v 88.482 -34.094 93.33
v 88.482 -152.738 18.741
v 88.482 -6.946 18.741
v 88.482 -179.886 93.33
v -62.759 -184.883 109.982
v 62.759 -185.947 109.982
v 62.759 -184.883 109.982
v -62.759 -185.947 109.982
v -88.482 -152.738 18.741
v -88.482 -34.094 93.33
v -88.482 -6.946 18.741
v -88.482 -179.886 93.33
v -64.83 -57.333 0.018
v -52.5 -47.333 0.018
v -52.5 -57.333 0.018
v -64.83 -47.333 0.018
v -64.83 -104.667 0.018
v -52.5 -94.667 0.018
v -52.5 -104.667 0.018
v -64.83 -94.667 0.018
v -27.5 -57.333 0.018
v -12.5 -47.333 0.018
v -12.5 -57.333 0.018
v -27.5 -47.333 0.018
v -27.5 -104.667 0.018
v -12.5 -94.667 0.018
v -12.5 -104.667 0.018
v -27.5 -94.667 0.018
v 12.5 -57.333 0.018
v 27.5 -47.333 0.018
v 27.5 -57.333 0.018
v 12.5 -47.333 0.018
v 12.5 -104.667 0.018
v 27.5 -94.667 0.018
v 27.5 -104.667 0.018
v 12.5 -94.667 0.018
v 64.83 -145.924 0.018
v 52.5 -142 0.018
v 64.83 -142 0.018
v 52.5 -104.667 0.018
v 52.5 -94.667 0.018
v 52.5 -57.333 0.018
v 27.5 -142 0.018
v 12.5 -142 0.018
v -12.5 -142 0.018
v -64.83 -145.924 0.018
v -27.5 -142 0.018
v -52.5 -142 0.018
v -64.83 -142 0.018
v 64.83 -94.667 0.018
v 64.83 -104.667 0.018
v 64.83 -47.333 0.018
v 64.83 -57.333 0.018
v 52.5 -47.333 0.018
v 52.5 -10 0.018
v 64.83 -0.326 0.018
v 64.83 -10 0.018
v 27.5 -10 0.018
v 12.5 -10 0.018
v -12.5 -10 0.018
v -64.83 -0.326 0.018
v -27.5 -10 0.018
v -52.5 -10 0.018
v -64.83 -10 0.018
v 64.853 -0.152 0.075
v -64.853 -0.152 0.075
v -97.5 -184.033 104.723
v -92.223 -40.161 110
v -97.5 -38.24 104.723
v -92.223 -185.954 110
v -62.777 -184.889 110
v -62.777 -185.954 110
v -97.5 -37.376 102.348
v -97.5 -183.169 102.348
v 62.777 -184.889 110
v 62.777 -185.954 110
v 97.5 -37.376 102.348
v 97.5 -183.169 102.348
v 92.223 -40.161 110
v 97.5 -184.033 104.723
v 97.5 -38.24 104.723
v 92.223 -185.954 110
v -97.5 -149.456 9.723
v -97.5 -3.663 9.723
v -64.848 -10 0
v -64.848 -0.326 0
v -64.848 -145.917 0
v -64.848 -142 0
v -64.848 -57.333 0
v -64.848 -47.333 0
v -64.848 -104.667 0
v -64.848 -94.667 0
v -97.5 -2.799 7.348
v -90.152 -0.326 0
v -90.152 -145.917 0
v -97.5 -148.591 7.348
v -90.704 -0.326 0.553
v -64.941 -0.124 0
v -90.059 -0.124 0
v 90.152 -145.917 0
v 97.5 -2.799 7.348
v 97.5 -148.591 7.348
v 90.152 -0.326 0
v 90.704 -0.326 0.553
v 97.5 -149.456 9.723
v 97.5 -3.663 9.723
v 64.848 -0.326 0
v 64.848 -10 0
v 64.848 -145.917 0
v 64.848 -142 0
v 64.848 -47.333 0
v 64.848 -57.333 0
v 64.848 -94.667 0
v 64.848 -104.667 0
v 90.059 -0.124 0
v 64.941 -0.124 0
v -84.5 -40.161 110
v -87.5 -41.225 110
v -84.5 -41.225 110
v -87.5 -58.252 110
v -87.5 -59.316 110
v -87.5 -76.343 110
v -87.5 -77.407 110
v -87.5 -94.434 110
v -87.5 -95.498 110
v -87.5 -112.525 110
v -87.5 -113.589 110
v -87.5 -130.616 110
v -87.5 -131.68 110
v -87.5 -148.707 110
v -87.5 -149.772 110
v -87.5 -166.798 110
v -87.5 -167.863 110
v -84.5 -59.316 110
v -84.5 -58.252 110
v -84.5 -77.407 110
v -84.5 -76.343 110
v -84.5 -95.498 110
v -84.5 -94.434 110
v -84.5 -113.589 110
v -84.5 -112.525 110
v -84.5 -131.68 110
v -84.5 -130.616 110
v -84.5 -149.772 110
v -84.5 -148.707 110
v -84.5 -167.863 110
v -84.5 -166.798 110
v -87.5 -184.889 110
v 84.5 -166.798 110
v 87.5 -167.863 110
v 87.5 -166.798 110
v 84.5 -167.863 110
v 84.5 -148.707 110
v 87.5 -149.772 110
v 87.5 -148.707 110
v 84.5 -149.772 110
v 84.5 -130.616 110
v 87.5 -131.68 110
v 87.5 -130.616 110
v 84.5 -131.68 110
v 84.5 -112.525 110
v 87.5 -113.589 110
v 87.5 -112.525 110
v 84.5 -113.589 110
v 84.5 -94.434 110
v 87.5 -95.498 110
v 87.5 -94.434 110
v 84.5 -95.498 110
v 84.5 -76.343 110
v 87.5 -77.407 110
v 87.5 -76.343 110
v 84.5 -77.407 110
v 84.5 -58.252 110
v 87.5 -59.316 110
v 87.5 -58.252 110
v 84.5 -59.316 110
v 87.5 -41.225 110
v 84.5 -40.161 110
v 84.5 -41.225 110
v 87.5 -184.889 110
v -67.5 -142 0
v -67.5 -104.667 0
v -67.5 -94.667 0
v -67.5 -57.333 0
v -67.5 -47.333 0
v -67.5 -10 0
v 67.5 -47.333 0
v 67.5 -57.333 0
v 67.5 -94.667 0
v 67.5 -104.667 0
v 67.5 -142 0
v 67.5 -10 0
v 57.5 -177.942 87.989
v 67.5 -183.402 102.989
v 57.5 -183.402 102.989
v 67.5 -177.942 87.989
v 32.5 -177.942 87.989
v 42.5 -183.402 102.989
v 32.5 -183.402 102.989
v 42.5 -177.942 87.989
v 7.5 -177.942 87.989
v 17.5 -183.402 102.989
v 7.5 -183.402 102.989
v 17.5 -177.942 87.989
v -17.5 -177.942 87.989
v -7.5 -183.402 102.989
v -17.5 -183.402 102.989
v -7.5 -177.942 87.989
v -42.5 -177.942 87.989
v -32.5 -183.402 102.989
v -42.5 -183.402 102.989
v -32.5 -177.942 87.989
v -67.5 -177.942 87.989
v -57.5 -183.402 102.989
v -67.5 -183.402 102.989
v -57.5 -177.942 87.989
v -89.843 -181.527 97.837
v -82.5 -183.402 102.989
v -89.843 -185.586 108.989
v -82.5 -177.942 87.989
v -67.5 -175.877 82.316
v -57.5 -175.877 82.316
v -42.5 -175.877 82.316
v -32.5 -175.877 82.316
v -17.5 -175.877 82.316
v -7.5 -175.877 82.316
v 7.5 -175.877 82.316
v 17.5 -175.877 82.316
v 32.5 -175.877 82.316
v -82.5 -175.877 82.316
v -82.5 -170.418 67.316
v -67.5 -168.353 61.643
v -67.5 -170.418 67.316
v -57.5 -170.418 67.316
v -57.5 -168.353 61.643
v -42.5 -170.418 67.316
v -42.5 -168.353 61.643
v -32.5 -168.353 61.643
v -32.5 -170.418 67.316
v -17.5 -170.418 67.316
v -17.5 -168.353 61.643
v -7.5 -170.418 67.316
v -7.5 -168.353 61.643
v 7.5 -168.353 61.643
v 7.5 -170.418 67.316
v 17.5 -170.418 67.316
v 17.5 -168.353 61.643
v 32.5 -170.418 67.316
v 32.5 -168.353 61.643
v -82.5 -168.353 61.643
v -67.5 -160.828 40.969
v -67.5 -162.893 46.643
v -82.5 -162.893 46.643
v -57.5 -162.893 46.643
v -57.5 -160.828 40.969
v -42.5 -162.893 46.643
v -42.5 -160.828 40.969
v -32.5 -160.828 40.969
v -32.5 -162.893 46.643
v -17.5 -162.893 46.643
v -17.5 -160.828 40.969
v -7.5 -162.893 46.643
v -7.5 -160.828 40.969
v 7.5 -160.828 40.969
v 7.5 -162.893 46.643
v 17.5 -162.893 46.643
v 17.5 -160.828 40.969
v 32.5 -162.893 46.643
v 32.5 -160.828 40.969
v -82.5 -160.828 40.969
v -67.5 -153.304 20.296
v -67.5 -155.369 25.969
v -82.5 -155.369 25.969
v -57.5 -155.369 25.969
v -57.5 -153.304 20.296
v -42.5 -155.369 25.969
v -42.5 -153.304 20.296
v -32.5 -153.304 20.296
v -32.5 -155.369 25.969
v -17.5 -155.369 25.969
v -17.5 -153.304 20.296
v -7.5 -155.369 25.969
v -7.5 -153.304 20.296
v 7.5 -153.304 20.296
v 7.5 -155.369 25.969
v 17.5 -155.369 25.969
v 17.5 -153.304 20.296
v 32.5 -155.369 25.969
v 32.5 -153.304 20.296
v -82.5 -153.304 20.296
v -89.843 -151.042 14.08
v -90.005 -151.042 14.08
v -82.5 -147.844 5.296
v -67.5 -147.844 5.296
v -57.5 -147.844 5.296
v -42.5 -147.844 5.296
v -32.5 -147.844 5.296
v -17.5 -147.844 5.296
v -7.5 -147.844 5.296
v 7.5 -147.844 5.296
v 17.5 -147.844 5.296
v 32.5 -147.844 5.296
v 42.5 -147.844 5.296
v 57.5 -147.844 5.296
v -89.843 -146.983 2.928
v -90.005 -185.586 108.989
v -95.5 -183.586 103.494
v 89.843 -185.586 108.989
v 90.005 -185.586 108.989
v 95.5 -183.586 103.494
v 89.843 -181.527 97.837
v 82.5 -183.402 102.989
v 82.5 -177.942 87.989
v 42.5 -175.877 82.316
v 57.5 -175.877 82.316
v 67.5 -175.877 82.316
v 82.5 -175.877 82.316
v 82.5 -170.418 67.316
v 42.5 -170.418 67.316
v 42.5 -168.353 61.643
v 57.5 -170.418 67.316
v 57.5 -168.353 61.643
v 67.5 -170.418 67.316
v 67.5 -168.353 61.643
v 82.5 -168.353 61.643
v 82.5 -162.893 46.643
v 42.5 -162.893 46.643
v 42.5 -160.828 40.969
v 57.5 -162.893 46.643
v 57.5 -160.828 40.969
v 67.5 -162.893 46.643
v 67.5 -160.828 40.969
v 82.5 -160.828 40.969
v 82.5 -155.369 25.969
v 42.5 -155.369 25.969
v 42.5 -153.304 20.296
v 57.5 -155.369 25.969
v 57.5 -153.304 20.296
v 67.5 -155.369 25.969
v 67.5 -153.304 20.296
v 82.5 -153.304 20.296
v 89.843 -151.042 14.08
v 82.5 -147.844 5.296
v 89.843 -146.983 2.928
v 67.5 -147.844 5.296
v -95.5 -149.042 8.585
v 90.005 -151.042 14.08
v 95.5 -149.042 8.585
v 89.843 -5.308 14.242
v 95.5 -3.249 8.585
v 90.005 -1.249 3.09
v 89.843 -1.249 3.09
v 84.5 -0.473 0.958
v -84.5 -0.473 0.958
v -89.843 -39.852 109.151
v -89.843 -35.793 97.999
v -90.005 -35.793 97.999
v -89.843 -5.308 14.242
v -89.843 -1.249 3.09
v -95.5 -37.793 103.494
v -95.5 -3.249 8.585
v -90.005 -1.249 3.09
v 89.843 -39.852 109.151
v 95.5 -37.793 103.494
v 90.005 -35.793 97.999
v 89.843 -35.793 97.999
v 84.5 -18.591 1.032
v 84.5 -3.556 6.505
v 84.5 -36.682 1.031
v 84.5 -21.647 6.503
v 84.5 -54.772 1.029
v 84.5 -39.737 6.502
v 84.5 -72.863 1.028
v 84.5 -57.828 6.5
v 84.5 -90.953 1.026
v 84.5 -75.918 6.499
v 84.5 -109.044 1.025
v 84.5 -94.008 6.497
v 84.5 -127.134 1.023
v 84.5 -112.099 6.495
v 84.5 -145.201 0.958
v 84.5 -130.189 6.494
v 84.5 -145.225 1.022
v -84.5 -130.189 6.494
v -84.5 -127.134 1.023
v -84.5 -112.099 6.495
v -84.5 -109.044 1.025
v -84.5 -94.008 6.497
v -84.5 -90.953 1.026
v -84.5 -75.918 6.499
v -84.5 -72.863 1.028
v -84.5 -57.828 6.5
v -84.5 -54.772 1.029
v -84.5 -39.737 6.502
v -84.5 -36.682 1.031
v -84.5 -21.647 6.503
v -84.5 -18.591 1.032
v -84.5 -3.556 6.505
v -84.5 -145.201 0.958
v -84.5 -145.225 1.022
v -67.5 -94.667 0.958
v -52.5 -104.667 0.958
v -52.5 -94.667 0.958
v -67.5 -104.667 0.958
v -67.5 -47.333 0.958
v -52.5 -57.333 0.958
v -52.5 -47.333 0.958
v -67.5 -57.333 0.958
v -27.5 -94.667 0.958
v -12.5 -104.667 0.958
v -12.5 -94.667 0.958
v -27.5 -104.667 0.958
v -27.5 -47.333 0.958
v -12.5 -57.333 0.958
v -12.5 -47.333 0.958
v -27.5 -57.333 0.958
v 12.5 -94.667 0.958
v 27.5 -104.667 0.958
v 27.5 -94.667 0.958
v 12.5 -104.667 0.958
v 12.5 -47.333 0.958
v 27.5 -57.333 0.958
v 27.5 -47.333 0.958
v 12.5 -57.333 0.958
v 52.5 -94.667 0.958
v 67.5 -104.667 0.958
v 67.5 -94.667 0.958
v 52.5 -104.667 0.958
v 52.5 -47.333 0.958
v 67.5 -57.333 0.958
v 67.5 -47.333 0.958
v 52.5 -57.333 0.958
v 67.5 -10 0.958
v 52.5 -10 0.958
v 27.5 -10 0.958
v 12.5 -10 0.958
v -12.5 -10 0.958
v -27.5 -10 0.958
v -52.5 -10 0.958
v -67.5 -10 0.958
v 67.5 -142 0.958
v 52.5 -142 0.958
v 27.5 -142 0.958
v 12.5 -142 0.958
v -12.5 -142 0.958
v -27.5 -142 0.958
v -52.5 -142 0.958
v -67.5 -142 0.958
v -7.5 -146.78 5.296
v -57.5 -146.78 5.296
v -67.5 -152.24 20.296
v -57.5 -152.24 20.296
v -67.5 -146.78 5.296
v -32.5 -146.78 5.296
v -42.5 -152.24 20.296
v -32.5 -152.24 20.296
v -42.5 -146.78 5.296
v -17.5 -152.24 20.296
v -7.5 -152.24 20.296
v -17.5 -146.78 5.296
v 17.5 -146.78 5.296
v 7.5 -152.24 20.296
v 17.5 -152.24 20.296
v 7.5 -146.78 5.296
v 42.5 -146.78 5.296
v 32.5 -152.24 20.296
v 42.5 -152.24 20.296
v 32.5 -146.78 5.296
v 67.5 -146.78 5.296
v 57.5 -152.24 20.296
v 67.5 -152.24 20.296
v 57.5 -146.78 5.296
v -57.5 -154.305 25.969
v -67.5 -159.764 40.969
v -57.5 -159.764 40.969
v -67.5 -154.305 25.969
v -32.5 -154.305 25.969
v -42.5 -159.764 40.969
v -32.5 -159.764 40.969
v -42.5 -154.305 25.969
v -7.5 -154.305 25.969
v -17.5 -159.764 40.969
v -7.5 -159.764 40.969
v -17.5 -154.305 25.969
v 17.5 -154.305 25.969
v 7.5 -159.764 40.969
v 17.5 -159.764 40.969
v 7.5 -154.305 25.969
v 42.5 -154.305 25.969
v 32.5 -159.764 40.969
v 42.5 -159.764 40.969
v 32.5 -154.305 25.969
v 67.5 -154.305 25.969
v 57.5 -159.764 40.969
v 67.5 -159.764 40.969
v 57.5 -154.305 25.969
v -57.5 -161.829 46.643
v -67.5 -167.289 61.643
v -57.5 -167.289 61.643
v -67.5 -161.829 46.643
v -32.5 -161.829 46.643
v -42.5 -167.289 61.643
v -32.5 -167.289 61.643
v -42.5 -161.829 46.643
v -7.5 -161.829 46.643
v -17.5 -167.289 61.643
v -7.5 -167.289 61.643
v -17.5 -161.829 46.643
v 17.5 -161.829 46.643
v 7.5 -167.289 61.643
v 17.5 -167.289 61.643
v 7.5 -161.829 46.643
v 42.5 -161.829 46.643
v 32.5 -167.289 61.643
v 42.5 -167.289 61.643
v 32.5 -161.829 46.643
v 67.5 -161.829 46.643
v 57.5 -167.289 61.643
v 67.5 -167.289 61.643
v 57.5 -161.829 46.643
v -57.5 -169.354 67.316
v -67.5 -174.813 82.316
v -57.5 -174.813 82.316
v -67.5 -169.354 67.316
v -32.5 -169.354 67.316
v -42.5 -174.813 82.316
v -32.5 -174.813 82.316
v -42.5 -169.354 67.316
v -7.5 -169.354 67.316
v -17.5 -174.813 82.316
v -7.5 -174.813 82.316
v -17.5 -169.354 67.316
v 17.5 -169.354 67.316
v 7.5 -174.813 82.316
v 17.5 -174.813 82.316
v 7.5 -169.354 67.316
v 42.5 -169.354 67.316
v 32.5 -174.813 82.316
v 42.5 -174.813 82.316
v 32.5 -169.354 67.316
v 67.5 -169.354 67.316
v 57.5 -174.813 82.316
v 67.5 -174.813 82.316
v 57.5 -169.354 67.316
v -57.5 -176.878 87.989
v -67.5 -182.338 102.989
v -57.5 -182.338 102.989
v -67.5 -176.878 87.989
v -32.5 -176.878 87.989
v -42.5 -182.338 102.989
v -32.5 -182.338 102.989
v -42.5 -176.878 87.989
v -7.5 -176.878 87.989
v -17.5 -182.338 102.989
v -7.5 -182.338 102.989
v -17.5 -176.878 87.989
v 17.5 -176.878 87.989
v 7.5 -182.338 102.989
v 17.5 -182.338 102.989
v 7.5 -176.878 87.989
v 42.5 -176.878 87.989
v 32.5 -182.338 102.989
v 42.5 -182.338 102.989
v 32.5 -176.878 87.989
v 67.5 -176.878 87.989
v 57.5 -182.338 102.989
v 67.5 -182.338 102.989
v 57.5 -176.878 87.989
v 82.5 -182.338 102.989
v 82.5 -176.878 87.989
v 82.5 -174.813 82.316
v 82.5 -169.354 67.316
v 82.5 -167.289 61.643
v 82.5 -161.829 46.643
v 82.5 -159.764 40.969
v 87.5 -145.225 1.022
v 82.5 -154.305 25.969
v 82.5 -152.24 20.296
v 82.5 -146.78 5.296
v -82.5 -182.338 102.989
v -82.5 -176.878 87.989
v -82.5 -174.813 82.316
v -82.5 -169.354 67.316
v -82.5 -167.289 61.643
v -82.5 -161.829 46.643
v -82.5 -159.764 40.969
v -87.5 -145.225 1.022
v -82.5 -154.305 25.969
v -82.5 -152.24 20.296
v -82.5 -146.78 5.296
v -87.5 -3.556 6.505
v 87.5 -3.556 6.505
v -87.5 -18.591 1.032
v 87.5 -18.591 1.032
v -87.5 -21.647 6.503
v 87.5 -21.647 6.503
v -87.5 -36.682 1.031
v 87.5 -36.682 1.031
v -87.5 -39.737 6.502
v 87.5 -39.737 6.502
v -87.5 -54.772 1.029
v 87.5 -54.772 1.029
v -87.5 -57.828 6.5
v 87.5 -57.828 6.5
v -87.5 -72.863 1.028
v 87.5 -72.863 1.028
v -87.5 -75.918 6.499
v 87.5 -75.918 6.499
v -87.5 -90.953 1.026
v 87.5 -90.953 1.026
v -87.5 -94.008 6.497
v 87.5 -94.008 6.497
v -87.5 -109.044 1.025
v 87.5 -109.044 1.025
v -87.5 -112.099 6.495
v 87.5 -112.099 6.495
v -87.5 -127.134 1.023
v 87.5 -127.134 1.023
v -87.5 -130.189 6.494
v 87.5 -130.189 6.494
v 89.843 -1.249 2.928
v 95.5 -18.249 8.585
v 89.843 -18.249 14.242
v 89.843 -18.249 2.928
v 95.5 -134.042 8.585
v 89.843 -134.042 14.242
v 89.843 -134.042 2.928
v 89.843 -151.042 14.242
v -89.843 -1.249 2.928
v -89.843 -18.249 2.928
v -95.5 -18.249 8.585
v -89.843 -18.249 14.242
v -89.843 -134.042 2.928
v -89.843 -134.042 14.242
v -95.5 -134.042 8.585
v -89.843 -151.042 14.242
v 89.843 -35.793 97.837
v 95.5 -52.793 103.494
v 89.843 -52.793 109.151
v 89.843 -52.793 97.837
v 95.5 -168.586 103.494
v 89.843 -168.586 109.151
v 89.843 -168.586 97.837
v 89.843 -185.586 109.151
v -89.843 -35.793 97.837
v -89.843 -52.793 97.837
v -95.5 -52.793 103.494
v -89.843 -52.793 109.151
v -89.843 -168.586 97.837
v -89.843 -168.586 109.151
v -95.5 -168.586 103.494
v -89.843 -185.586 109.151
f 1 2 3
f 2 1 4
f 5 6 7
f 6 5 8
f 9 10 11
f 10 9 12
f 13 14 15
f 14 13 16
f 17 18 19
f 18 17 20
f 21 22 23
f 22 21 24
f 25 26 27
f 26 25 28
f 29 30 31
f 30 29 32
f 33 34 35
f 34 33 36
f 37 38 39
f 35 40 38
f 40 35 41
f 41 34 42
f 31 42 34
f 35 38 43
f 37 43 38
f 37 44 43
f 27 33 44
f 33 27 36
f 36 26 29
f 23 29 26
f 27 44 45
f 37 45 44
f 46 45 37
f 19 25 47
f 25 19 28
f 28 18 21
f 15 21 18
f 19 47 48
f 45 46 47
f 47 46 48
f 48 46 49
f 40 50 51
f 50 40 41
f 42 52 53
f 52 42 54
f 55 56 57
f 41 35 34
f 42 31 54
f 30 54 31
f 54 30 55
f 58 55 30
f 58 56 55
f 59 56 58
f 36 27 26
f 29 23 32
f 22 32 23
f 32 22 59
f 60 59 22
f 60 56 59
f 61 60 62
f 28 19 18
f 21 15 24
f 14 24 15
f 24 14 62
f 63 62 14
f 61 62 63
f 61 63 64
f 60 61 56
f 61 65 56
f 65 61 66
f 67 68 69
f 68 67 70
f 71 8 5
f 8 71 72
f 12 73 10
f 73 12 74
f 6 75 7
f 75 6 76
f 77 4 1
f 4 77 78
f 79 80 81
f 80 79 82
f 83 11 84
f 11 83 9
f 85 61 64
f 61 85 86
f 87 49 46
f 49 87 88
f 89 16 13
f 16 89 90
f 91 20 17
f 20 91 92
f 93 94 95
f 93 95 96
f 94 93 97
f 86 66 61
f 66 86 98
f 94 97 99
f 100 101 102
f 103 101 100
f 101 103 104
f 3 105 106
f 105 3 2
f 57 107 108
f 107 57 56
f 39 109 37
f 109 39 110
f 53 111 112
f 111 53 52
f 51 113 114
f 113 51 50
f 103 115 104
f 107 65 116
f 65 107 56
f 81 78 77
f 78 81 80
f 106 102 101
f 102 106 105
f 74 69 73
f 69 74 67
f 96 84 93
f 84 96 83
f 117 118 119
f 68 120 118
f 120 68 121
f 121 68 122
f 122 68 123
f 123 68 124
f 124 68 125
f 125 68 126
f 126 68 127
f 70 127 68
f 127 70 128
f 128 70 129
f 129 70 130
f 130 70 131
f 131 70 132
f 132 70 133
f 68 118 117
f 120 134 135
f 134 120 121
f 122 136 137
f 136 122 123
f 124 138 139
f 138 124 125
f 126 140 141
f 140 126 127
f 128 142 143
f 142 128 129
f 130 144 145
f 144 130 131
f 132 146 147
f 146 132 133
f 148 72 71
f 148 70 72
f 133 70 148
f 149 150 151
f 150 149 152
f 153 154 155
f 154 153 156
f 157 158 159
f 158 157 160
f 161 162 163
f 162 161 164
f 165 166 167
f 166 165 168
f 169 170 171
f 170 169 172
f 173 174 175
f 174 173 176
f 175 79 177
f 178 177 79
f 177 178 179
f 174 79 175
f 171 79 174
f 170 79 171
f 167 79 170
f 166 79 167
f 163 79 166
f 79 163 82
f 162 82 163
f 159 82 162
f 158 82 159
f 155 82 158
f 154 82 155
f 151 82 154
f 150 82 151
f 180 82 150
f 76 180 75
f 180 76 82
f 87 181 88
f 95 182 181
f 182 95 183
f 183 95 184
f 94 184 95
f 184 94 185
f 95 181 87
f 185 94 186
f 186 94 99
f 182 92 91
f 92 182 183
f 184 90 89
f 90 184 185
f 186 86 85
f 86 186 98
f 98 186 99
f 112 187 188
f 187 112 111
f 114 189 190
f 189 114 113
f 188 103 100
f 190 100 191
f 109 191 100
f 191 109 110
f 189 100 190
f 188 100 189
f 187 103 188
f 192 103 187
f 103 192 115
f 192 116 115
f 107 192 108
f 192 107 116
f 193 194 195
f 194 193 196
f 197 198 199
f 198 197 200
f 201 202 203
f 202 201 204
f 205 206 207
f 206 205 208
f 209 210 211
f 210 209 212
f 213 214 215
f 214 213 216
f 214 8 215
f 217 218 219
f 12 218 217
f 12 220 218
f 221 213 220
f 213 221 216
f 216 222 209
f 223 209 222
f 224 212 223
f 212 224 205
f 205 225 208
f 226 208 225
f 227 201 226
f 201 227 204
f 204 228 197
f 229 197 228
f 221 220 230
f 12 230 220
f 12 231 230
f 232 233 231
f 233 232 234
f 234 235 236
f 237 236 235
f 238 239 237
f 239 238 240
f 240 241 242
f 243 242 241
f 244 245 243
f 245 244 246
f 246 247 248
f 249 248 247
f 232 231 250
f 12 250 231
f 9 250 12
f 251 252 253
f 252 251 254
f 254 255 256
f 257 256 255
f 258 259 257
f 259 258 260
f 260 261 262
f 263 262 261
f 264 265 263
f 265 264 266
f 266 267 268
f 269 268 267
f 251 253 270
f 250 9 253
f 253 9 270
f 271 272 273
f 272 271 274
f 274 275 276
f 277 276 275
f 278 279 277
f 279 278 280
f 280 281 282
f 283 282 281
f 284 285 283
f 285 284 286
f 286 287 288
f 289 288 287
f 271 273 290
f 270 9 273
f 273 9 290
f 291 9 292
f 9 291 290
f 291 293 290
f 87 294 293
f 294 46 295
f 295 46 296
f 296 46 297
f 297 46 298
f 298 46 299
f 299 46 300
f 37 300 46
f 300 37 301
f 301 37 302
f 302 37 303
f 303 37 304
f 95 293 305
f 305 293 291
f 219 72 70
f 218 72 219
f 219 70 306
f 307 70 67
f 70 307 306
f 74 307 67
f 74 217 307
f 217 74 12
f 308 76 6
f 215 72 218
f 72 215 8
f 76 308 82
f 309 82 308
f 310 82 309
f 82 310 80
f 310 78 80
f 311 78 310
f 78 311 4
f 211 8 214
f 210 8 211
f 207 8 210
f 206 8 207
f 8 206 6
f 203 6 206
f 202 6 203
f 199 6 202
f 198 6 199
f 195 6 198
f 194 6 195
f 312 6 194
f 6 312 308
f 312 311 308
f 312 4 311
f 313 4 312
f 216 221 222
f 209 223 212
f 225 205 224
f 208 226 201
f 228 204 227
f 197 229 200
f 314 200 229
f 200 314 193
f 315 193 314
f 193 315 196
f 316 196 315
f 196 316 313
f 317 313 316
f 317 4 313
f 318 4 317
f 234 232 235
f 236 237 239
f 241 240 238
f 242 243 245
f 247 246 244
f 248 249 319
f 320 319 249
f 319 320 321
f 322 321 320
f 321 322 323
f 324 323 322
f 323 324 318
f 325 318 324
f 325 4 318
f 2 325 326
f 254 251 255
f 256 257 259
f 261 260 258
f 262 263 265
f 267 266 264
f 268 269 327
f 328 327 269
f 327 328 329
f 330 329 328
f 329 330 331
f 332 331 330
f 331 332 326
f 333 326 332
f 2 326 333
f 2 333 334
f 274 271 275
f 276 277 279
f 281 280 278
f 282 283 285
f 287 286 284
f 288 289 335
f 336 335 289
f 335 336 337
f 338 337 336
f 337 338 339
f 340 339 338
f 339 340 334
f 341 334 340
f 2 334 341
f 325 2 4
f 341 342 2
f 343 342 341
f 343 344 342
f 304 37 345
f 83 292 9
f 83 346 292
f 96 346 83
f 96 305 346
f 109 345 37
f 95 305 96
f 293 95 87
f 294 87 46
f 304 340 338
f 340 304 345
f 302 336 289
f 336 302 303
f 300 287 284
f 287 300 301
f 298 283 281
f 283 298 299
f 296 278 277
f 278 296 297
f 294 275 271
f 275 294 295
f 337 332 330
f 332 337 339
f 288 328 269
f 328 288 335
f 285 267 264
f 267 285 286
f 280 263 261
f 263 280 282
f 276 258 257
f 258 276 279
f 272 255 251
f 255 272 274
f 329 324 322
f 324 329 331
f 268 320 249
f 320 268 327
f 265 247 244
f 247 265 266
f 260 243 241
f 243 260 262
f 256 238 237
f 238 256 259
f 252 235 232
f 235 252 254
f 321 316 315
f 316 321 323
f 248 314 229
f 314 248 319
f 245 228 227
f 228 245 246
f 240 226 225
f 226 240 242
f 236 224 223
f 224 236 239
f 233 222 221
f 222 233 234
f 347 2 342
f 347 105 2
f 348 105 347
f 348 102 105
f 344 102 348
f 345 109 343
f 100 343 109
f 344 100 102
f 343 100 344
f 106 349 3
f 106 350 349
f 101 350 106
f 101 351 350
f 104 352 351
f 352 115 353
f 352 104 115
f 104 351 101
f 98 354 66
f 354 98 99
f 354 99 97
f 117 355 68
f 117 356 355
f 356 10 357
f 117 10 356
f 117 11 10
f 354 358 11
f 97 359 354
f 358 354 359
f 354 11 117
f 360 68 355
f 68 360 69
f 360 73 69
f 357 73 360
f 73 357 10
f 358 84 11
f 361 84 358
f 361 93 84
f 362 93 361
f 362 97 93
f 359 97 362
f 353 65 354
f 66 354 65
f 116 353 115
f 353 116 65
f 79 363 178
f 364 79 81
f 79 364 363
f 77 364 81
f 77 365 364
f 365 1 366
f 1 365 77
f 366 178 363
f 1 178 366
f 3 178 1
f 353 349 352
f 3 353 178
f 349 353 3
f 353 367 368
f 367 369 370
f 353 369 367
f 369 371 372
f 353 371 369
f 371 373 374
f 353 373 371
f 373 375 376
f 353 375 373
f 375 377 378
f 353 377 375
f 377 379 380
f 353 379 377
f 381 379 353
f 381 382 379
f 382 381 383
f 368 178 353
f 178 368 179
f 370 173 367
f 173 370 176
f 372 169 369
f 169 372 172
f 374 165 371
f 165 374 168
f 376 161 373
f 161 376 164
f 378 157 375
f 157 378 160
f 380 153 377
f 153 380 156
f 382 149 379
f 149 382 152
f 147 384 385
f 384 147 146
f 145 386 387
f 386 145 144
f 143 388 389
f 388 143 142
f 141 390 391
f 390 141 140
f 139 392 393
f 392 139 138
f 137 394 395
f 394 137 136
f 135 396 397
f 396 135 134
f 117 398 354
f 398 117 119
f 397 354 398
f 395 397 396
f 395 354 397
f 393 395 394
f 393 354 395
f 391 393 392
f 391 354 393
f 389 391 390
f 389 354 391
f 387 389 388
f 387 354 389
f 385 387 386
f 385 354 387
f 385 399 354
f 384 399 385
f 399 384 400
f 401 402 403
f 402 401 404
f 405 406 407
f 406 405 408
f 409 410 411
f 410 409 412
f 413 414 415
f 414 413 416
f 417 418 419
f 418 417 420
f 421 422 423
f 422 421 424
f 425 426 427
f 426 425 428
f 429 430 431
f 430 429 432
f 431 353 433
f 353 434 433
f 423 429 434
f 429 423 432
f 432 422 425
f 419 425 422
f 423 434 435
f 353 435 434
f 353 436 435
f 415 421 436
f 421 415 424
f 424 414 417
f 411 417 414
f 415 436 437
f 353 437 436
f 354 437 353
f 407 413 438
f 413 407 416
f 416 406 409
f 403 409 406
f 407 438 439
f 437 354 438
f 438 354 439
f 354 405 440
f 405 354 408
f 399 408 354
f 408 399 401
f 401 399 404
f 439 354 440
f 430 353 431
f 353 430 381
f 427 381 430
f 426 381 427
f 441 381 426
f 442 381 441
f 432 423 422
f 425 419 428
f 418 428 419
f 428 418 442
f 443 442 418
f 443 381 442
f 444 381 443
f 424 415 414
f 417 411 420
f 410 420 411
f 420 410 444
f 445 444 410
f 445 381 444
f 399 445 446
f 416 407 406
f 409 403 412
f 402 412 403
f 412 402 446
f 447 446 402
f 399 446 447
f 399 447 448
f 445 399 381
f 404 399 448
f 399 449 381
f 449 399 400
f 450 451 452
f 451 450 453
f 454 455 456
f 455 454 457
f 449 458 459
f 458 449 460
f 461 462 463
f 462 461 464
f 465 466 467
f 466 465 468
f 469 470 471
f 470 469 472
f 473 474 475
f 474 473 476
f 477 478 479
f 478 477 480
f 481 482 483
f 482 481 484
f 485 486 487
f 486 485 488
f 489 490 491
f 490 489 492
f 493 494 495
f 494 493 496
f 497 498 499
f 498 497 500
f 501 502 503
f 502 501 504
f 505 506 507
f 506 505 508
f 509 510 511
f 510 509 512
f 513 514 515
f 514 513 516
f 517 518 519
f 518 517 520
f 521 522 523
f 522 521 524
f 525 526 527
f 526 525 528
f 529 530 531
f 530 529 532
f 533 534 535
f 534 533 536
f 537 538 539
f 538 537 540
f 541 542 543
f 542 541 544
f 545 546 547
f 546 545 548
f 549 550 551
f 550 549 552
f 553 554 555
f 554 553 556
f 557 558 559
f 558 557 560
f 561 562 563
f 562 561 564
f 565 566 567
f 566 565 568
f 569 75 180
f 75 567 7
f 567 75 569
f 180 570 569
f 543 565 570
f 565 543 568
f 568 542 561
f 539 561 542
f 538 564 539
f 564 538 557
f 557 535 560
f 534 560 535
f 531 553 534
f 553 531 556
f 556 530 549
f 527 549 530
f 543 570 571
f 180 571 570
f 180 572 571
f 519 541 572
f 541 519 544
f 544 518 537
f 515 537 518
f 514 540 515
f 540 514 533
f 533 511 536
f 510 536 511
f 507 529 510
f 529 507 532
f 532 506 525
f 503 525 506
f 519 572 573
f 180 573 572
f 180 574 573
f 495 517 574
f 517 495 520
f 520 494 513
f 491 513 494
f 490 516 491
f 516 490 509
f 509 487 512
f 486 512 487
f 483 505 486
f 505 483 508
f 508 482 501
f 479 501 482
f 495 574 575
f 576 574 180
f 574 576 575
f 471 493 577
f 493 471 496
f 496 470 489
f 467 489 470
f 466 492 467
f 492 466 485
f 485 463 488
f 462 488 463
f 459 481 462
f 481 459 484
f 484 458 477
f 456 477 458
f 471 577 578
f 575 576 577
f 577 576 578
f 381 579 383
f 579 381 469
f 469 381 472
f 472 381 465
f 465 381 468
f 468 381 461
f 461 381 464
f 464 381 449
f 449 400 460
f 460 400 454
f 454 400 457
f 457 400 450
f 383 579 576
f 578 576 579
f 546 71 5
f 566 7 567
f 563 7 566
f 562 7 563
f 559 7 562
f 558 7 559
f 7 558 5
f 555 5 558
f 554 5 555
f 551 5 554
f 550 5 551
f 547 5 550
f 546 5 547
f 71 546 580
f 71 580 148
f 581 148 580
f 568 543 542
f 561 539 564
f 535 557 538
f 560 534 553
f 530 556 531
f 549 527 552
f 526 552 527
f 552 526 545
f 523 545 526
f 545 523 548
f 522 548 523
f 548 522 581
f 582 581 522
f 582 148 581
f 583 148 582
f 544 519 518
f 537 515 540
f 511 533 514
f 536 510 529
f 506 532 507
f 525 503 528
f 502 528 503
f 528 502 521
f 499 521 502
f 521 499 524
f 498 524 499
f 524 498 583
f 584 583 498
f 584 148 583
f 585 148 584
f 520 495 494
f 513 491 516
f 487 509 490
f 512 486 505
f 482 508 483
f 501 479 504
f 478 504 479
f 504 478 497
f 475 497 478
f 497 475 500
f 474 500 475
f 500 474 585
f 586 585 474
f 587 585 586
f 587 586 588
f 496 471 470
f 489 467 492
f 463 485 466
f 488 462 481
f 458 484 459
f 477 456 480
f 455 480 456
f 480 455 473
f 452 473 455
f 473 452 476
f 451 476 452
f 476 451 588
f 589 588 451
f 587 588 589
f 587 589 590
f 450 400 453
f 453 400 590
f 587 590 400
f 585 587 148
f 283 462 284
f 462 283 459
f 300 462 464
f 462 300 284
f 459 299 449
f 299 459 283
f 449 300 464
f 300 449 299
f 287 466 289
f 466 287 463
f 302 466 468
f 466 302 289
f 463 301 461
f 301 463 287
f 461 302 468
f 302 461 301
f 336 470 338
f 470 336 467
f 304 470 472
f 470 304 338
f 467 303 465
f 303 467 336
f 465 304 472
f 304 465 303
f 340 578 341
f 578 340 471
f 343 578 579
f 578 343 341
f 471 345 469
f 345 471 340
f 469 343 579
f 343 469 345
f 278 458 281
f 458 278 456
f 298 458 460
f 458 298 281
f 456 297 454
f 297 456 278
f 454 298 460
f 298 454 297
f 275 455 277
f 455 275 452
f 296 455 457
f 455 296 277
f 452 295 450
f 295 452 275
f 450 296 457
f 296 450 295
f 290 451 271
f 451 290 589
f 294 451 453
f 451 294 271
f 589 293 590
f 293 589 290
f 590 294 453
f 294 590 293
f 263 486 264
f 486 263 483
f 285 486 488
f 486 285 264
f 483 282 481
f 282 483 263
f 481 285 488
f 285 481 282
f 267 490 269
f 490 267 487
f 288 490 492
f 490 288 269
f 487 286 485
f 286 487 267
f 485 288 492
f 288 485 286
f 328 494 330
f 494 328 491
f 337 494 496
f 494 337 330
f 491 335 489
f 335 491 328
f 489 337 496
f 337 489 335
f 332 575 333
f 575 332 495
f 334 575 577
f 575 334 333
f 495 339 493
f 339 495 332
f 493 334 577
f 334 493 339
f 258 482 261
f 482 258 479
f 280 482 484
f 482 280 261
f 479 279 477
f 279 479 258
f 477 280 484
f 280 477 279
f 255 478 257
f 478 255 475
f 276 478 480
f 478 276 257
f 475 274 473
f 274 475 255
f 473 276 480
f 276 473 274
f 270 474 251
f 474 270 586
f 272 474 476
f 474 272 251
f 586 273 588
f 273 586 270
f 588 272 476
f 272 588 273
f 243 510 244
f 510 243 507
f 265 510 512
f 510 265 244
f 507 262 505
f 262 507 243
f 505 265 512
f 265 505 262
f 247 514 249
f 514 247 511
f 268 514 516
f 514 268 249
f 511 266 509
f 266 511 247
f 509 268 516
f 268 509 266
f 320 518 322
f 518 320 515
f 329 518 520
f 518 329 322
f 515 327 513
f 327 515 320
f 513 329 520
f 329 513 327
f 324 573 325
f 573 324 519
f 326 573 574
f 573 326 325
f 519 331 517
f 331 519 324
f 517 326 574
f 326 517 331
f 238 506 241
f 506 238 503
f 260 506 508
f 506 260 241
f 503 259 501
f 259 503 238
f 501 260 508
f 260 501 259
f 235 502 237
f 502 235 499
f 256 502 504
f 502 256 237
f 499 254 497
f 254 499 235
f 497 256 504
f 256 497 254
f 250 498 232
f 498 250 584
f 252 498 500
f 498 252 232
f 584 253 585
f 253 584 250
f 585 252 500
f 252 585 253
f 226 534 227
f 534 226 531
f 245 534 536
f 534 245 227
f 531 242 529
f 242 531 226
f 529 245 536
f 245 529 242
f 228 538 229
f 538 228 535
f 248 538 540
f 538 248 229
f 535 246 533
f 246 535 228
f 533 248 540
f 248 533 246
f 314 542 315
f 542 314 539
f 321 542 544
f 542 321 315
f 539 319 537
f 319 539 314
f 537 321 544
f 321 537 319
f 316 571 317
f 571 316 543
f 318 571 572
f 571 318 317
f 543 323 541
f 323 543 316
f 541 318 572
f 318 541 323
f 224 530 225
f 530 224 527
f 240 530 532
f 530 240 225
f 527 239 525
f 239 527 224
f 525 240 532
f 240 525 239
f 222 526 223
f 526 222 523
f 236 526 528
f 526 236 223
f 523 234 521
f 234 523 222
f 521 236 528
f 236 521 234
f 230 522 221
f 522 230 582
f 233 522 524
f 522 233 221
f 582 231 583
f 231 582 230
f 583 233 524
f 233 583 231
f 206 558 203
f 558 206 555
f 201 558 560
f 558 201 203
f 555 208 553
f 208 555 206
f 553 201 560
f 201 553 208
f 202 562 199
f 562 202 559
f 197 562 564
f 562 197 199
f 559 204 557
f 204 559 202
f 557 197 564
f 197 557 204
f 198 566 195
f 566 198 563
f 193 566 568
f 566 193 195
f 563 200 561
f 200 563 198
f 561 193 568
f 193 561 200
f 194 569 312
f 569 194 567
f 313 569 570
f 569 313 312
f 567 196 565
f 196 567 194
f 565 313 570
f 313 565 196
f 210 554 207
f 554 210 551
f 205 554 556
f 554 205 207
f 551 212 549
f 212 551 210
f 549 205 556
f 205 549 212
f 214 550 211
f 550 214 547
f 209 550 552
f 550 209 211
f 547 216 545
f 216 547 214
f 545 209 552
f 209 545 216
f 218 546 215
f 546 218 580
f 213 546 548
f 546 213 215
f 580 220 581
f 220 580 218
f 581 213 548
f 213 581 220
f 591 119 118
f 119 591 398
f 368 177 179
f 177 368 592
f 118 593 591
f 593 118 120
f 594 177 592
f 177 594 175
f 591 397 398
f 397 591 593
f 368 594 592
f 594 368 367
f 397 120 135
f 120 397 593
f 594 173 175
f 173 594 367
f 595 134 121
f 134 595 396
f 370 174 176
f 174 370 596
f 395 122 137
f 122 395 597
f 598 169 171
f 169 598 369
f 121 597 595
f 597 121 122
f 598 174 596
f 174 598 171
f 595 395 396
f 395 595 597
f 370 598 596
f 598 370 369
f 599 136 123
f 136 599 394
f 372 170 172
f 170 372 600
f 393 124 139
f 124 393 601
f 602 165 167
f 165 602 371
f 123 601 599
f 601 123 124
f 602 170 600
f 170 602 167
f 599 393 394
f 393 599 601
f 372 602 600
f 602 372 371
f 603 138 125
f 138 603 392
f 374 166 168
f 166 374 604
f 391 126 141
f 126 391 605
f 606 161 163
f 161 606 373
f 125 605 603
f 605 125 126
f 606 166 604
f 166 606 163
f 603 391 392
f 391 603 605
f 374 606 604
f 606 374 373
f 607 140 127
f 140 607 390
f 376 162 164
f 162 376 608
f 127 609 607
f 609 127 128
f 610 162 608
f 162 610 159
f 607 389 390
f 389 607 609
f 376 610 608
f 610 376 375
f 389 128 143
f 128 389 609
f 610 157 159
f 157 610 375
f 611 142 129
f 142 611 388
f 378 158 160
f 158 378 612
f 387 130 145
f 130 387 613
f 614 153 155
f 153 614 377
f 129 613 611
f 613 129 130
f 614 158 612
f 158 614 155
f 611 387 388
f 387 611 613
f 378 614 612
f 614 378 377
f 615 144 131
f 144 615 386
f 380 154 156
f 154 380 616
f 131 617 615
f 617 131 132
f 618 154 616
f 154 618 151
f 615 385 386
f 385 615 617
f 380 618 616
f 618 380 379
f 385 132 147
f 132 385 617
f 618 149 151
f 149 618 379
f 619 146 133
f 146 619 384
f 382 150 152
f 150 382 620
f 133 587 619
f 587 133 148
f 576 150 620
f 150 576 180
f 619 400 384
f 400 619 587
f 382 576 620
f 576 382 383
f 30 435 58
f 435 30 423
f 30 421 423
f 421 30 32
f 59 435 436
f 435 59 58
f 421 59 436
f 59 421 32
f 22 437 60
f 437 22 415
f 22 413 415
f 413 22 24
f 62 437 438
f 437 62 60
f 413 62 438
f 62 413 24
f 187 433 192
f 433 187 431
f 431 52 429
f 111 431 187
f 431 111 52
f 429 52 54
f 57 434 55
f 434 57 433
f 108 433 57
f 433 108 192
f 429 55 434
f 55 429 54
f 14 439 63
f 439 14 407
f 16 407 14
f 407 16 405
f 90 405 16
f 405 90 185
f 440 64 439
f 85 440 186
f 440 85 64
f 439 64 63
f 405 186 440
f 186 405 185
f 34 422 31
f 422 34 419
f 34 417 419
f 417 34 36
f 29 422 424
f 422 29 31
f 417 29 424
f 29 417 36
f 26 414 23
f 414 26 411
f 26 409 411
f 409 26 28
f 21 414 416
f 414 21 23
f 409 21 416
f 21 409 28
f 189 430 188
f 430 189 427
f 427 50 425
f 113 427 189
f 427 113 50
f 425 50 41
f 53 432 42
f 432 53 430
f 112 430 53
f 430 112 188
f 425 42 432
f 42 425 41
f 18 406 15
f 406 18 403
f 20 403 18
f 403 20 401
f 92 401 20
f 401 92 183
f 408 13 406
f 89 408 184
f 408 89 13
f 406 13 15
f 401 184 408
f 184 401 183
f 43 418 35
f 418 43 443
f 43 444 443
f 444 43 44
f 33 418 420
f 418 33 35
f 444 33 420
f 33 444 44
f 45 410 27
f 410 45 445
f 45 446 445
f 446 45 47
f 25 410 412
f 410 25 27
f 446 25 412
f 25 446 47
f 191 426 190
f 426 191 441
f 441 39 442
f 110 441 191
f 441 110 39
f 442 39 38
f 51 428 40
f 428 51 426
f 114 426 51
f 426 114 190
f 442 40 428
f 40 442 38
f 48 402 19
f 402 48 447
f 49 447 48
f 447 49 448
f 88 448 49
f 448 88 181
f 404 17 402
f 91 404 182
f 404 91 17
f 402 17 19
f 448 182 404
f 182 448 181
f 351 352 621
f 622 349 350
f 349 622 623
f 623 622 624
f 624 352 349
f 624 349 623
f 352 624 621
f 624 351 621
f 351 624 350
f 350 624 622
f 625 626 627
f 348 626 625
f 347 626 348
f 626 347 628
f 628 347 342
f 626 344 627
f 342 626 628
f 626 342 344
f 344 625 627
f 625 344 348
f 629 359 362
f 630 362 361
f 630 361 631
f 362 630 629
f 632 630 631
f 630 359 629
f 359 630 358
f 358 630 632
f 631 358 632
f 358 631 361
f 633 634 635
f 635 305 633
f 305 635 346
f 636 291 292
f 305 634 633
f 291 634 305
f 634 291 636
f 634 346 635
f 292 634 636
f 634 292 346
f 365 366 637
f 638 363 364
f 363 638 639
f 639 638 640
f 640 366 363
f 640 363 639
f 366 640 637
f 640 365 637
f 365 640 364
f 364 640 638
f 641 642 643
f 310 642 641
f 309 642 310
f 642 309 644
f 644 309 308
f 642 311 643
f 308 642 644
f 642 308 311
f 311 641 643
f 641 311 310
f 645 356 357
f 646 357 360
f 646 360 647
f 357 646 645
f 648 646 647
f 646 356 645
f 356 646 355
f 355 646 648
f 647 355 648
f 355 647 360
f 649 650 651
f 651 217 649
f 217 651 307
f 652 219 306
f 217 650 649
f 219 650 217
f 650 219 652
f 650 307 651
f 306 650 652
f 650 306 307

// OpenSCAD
module rounded_cube(x,y,z,corner) {

    module rcube(x,y,z,corner) {
        translate([corner/2,corner/2,corner/2]) hull() {
            sphere(d=corner);
            if (x>corner) translate([x-corner,0,0]) sphere(d=corner);
            if (x>corner && y>corner) translate([x-corner,y-corner,0]) sphere(d=corner);
            if (y>corner) translate([0,y-corner,0]) sphere(d=corner);
            if (z>corner) translate([0,0,z-corner]) sphere(d=corner);
            if (z>corner && x>corner) translate([x-corner,0,z-corner]) sphere(d=corner);
            if (z>corner && x>corner && y>corner) translate([x-corner,y-corner,z-corner]) sphere(d=corner);
            if (z>corner && y>corner)translate([0,y-corner,z-corner]) sphere(d=corner);
        }
    }
    
    diff_x = x<corner ? (corner-x)/2 : 0;
    diff_y = y<corner ? (corner-y)/2 : 0;
    diff_z = z<corner ? (corner-z)/2 : 0;
    
    translate([-diff_x,-diff_y,-diff_z]) intersection() {
        rcube(x,y,z,corner);
        translate([diff_x,diff_y,diff_z]) cube([x,y,z]);
    }
}

box_depth = 16;
box_h = 175;
box_w = 137.5;

angle = 20;

//interval = sqrt(box_depth*box_depth*2) + 1;
interval =  box_depth + 1;
echo(interval);

module mock_bluray_box(texti=false) {
    cube([box_depth, box_w, box_h]);
    if (texti) {
        color("black") translate([3,0,box_h-40]) rotate([90, 90,0]) text("Testi Testi Testi");
    }
}

module mock_assembly() {
    for (i = [0:15]) {
        translate([0,0,i*interval]) rotate([-45,0,0]) rotate([0,-90,0]) mock_bluray_box();
    }
}

module stick(length=30) {
    linear_extrude(height=length) polygon(points=[[0,8], [8,0], [0,0]]);
}

module frame(count) {
    
    h = interval * count + 1;
    height = h+100;
    
    width = box_h + 2;
    module corner() {
        translate([-25/2, -25/2, 0]) rounded_cube(30,30,height,3, $fn=20);
    }
    
    module sticks(length=30) {
        z = h / cos(angle) - length;
        translate([0,0,-2]) stick(length+2);
        translate([0,0,z]) stick(length+2);
    }

    module body() {
        intersection() {
            translate([0,0,-1]) rotate([-angle,0,0]) intersection() {
                union() {
                    translate([-width/2,0,0]) rounded_cube(width, 110, height, 3, $fn=20);
                    translate([-box_h/2+10, 100,0]) rotate([0,0,45]) corner();
                    translate([box_h/2-10, 100,0]) rotate([0,0,45]) corner();
                    translate([-box_h/2+10, 5,0]) rotate([0,0,45]) corner();
                    translate([box_h/2-10, 5,0]) rotate([0,0,45]) corner();
                }
                translate([-(box_h+20)/2, 0,1]) cube([box_h+20, 110, height]);
            }
            translate([0,100,h/2]) cube([box_h+20, 400, h], center=true);
        }
    }
    
    translate([0,0,-sin(angle)*1]) rotate([90+angle,0,0]) difference() {
        body();
        intersection() {
            rotate([-angle,0,0]) translate([-(box_h-6)/2,1.3,0]) cube([box_h-6, 130,height]);
            translate([0,100,h/2-1]) cube([box_h+20, 400, h], center=true);
        }

        for (i = [0:4]) {
            translate([-15/2,i*22+6,0]) rotate([-angle,0,0]) cube([15,15,2*h]);
            translate([-15/2+25,i*22+6,0]) rotate([-angle,0,0]) cube([15,15,2*h]);
            translate([-15/2+50,i*22+6,0]) rotate([-angle,0,0]) cube([15,15,2*h]);
            translate([-15/2+75,i*22+6,0]) rotate([-angle,0,0]) cube([15,15,2*h]);
            translate([-15/2-25,i*22+6,0]) rotate([-angle,0,0]) cube([15,15,2*h]);
            translate([-15/2-50,i*22+6,0]) rotate([-angle,0,0]) cube([15,15,2*h]);
            translate([-15/2-75,i*22+6,0]) rotate([-angle,0,0]) cube([15,15,2*h]);
        }

        y_step = sin(angle+0.1) * (interval+1);
        echo(y_step);
        for (i = [0:count-1]) {
            translate([box_h/2,7.65+i*y_step,i*interval+1]) rotate([0,-90,0]) mock_bluray_box();
        }

        ratio = (h - 10)/(30+10);
        slot = floor(ratio);
        cube_h = (30+10) * (ratio/slot) - 5;
        echo(ratio, cube_h);
        if (slot > 0) {
            offset = cube_h/2 + 10;
            #for (i = [0:slot-1]) {
                rotate([-angle,0,0]) translate([20,5,i*(cube_h+10) + offset]) cube([15,15,cube_h], center=true);
                rotate([-angle,0,0]) translate([-20,5,i*(cube_h+10) + offset]) cube([15,15,cube_h], center=true);
                rotate([-angle,0,0]) translate([60,5,i*(cube_h+10) + offset]) cube([15,15,cube_h], center=true);
                rotate([-angle,0,0]) translate([-60,5,i*(cube_h+10) + offset]) cube([15,15,cube_h], center=true);
            }
        }

        translate([box_h/2+8,9.5,0]) rotate([-angle,0,0]) rotate([0,0,135]) sticks(30/2);
        translate([-(box_h/2+8),9.5,0]) rotate([-angle,0,0]) rotate([0,0,-45]) sticks(30/2);
        
        translate([box_h/2+8,110.5,0]) rotate([-angle,0,0]) rotate([0,0,135]) sticks(30/2);
        translate([-(box_h/2+8),110.5,0]) rotate([-angle,0,0]) rotate([0,0,-45]) sticks(30/2);
    }
}

//%mock_bluray_box();

//mock_assembly();

//cube([box_h + 4, 100, 200]);

module test_pieces() {
//    translate([0,0,-2]) intersection() {
//        frame(2);
//        translate([box_h/2-2,-20,2]) cube([20,20,13]);
//    }
    translate([0,0,-6]) intersection() {
        frame(1);
        translate([-17.5,-40,6]) cube([80,20,31]);
    }
    translate([-17.5,-26,0]) cube([80,10,1]);
    
    translate([60,-10,0]) rotate([0,-90,0]) scale([0.92,0.92,1]) stick(30-1);
}

frame(8);

//translate([0,10,0]) rotate([0,-90,0]) scale([1,0.98,0.98]) stick(30-1);
//test_pieces();
